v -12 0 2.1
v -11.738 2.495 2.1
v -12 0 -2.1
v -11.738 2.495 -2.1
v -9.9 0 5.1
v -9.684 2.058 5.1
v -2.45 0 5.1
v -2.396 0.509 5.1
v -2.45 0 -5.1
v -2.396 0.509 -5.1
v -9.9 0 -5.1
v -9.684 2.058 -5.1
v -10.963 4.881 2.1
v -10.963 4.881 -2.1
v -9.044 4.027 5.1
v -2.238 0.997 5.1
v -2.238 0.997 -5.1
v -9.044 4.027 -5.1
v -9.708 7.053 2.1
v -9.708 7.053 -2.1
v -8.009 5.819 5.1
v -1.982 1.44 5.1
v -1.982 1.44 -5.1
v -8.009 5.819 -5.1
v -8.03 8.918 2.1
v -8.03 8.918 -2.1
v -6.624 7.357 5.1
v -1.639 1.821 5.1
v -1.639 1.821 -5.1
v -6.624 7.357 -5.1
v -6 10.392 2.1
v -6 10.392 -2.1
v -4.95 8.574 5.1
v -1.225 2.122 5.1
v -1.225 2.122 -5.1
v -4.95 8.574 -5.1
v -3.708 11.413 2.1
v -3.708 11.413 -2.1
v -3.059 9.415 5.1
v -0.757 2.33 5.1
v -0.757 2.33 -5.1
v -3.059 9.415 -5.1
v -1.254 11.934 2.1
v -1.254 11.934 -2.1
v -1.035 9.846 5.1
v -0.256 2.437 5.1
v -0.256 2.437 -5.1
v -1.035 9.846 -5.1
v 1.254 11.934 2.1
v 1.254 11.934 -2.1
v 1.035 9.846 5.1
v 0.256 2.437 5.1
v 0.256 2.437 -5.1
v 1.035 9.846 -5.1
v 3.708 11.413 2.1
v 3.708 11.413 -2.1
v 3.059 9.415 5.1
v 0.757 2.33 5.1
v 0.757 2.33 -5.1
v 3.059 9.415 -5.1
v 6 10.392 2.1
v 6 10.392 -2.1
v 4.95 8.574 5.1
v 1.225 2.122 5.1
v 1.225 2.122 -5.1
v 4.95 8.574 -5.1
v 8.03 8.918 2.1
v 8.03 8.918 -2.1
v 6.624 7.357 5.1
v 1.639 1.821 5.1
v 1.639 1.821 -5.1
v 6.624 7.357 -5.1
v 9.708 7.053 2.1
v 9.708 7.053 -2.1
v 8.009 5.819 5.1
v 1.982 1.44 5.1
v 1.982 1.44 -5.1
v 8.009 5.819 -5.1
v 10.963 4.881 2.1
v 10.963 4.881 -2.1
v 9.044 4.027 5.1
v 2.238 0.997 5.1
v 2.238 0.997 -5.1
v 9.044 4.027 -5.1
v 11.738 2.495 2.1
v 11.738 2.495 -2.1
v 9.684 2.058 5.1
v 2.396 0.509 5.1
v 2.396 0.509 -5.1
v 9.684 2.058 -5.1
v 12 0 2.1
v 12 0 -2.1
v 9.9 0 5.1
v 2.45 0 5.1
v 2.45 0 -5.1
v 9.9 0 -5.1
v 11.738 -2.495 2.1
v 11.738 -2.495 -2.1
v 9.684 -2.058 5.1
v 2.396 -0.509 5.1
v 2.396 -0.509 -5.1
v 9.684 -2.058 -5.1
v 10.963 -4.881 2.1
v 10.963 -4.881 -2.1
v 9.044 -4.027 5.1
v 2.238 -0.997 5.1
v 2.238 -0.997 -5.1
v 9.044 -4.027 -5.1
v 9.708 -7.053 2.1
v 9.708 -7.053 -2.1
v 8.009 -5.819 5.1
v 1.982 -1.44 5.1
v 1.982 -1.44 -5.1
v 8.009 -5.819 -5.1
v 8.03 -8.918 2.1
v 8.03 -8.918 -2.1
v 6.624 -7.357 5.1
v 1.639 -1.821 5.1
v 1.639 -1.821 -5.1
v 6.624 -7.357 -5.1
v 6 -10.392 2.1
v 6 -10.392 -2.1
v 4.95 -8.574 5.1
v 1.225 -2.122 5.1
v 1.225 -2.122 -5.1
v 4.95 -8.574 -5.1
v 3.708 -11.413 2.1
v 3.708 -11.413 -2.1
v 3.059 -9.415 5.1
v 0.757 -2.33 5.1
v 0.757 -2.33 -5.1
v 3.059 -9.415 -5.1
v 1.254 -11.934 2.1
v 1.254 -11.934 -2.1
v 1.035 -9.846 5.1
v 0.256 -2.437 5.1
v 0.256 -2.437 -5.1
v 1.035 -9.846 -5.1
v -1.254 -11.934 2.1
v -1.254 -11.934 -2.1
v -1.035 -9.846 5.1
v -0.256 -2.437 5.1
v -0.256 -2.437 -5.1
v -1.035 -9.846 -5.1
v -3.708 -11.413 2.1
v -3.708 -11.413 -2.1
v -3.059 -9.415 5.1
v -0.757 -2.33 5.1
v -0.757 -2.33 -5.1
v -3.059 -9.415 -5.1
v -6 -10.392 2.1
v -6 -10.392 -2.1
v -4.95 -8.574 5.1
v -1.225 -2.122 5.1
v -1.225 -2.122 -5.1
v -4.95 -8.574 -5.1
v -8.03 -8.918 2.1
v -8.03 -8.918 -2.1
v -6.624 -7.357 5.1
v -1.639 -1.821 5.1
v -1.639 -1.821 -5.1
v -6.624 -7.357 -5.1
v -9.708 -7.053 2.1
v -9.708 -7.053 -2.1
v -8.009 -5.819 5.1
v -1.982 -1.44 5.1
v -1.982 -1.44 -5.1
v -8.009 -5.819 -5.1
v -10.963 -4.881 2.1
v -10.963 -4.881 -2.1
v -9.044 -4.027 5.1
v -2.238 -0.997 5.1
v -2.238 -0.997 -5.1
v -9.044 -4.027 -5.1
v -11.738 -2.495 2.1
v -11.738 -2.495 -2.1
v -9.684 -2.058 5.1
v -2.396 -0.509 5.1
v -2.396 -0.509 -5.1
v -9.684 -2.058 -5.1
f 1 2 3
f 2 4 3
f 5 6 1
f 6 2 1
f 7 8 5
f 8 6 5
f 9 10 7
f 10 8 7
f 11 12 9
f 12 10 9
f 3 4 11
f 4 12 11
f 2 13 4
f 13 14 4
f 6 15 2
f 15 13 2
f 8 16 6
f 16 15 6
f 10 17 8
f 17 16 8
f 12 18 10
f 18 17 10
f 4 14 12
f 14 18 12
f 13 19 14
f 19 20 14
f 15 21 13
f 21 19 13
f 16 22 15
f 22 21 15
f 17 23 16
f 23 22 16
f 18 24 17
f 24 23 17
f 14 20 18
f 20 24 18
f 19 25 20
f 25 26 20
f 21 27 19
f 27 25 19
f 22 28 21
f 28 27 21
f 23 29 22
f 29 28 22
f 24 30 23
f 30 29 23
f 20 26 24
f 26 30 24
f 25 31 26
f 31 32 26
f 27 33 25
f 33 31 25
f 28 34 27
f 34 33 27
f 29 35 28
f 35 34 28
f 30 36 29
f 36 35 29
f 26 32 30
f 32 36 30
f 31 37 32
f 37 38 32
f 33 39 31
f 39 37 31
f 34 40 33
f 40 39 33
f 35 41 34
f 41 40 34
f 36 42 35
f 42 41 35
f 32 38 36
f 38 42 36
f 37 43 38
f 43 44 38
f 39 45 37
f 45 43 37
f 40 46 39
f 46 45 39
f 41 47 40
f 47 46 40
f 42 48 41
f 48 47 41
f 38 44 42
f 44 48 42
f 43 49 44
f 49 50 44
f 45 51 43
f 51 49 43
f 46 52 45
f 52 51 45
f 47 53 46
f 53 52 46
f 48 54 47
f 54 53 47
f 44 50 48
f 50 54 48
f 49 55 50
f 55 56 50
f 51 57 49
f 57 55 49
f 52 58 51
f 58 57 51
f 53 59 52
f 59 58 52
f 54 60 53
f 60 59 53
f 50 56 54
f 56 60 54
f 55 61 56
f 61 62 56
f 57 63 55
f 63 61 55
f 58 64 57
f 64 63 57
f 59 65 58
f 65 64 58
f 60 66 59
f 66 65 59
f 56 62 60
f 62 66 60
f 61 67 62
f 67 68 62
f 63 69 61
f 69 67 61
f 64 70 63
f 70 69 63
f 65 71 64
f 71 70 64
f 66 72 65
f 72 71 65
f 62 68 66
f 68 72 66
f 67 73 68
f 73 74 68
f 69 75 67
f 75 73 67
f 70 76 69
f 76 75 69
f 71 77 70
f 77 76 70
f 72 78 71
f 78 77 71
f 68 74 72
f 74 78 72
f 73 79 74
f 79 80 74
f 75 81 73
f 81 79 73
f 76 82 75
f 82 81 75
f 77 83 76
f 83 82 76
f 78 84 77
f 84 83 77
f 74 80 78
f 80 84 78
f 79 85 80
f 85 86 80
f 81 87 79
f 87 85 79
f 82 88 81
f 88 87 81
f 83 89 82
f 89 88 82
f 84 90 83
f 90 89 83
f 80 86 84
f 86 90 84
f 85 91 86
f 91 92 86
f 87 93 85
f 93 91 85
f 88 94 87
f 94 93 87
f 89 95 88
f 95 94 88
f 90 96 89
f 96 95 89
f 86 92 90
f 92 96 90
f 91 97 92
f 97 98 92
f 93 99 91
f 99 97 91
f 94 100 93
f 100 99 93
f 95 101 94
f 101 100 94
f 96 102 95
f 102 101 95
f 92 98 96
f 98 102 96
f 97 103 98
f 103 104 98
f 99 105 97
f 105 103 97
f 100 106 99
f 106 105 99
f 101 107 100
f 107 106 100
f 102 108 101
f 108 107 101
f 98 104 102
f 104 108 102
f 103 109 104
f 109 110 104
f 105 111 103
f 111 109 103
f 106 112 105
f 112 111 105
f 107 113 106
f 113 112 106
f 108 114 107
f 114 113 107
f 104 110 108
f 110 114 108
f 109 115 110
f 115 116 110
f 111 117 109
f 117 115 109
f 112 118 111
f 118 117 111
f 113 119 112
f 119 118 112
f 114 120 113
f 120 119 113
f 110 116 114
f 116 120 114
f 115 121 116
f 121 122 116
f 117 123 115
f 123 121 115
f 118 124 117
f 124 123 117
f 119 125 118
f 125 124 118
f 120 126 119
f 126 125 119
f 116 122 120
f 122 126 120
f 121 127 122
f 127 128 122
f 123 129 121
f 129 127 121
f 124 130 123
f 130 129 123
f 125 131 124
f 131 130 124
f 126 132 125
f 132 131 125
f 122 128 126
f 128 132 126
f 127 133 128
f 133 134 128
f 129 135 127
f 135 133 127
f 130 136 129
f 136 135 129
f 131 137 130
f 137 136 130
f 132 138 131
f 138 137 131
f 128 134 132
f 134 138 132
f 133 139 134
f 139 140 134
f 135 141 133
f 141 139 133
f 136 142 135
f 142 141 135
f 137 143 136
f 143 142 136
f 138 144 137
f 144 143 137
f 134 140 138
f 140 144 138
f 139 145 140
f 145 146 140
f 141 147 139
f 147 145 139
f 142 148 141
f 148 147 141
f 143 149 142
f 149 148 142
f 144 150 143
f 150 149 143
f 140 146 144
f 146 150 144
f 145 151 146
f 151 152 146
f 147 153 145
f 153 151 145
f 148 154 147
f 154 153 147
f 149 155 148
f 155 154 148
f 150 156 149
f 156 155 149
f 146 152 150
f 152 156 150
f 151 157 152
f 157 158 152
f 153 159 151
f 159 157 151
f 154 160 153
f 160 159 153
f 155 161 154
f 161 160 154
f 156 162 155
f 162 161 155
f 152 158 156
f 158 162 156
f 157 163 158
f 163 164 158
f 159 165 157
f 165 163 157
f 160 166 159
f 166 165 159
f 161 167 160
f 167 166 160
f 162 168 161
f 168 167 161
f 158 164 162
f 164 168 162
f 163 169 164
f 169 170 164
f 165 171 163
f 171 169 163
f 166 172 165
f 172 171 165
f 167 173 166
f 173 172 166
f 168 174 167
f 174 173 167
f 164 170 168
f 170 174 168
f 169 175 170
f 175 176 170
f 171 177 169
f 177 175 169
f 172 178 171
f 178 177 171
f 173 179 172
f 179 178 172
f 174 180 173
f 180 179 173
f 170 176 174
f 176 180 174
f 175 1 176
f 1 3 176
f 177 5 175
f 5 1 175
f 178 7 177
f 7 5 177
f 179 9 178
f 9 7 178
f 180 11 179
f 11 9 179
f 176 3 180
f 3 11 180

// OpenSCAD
//###############################################################################
//# DIY Laser Bed - Wheel                                                       #
//###############################################################################
//#    Copyright 2020 Dirk Heisswolf                                            #
//#    This file is part of the DIY Laser Bed project.                          #
//#                                                                             #
//#    This project is free software: you can redistribute it and/or modify     #
//#    it under the terms of the GNU General Public License as published by     #
//#    the Free Software Foundation, either version 3 of the License, or        #
//#    (at your option) any later version.                                      #
//#                                                                             #
//#    This project is distributed in the hope that it will be useful,          #
//#    but WITHOUT ANY WARRANTY; without even the implied warranty of           #
//#    MERCHANTABILITY or FITNESS FOR A PARTICULAR PURPOSE.  See the            #
//#    GNU General Public License for more details.                             #
//#                                                                             #
//#    You should have received a copy of the GNU General Public License        #
//#    along with this project.  If not, see <http://www.gnu.org/licenses/>.    #
//#                                                                             #
//#    This project makes use of the NopSCADlib library                         #
//#    (see https://github.com/nophead/NopSCADlib).                             #
//#                                                                             #
//###############################################################################
//# Description:                                                                #
//#   Model of slider wheels (Openbuilds style).                                #
//#                                                                             #
//###############################################################################
//# Version History:                                                            #
//#   February 18, 2020                                                         #
//#      - Initial release                                                      #
//#                                                                             #
//###############################################################################

//        n        b    w    d      0 
//        a        o    i    i      w
//        m        r    d    a      i
//        e        e    t    m      d
//                      h    .      .
TypeA = ["Type A", 4.9, 10.2, 24,   6];
TypeD = ["Type D", 4.9,  8.8, 15.4, 5];


module wheel(w_type=["Type A", 4.9, 10.2, 24,   6]) {

    bore       = w_type[1];
    width      = w_type[2];
    diameter   = w_type[3];
    trackwidth = w_type[4];
    
                color("grey")
                translate([0,0,0])
                rotate([0,0,0])
                rotate_extrude(angle=360)
                polygon([[bore/2,width/2],
                         [(diameter+trackwidth-width)/2,width/2],
                         [diameter/2,(width-trackwidth)/2],
                         [diameter/2,-(width-trackwidth)/2],
                         [(diameter+trackwidth-width)/2,-width/2],
                         [bore/2,-width/2]]);
 

    
}

//Demo coin
wheel(TypeA);
